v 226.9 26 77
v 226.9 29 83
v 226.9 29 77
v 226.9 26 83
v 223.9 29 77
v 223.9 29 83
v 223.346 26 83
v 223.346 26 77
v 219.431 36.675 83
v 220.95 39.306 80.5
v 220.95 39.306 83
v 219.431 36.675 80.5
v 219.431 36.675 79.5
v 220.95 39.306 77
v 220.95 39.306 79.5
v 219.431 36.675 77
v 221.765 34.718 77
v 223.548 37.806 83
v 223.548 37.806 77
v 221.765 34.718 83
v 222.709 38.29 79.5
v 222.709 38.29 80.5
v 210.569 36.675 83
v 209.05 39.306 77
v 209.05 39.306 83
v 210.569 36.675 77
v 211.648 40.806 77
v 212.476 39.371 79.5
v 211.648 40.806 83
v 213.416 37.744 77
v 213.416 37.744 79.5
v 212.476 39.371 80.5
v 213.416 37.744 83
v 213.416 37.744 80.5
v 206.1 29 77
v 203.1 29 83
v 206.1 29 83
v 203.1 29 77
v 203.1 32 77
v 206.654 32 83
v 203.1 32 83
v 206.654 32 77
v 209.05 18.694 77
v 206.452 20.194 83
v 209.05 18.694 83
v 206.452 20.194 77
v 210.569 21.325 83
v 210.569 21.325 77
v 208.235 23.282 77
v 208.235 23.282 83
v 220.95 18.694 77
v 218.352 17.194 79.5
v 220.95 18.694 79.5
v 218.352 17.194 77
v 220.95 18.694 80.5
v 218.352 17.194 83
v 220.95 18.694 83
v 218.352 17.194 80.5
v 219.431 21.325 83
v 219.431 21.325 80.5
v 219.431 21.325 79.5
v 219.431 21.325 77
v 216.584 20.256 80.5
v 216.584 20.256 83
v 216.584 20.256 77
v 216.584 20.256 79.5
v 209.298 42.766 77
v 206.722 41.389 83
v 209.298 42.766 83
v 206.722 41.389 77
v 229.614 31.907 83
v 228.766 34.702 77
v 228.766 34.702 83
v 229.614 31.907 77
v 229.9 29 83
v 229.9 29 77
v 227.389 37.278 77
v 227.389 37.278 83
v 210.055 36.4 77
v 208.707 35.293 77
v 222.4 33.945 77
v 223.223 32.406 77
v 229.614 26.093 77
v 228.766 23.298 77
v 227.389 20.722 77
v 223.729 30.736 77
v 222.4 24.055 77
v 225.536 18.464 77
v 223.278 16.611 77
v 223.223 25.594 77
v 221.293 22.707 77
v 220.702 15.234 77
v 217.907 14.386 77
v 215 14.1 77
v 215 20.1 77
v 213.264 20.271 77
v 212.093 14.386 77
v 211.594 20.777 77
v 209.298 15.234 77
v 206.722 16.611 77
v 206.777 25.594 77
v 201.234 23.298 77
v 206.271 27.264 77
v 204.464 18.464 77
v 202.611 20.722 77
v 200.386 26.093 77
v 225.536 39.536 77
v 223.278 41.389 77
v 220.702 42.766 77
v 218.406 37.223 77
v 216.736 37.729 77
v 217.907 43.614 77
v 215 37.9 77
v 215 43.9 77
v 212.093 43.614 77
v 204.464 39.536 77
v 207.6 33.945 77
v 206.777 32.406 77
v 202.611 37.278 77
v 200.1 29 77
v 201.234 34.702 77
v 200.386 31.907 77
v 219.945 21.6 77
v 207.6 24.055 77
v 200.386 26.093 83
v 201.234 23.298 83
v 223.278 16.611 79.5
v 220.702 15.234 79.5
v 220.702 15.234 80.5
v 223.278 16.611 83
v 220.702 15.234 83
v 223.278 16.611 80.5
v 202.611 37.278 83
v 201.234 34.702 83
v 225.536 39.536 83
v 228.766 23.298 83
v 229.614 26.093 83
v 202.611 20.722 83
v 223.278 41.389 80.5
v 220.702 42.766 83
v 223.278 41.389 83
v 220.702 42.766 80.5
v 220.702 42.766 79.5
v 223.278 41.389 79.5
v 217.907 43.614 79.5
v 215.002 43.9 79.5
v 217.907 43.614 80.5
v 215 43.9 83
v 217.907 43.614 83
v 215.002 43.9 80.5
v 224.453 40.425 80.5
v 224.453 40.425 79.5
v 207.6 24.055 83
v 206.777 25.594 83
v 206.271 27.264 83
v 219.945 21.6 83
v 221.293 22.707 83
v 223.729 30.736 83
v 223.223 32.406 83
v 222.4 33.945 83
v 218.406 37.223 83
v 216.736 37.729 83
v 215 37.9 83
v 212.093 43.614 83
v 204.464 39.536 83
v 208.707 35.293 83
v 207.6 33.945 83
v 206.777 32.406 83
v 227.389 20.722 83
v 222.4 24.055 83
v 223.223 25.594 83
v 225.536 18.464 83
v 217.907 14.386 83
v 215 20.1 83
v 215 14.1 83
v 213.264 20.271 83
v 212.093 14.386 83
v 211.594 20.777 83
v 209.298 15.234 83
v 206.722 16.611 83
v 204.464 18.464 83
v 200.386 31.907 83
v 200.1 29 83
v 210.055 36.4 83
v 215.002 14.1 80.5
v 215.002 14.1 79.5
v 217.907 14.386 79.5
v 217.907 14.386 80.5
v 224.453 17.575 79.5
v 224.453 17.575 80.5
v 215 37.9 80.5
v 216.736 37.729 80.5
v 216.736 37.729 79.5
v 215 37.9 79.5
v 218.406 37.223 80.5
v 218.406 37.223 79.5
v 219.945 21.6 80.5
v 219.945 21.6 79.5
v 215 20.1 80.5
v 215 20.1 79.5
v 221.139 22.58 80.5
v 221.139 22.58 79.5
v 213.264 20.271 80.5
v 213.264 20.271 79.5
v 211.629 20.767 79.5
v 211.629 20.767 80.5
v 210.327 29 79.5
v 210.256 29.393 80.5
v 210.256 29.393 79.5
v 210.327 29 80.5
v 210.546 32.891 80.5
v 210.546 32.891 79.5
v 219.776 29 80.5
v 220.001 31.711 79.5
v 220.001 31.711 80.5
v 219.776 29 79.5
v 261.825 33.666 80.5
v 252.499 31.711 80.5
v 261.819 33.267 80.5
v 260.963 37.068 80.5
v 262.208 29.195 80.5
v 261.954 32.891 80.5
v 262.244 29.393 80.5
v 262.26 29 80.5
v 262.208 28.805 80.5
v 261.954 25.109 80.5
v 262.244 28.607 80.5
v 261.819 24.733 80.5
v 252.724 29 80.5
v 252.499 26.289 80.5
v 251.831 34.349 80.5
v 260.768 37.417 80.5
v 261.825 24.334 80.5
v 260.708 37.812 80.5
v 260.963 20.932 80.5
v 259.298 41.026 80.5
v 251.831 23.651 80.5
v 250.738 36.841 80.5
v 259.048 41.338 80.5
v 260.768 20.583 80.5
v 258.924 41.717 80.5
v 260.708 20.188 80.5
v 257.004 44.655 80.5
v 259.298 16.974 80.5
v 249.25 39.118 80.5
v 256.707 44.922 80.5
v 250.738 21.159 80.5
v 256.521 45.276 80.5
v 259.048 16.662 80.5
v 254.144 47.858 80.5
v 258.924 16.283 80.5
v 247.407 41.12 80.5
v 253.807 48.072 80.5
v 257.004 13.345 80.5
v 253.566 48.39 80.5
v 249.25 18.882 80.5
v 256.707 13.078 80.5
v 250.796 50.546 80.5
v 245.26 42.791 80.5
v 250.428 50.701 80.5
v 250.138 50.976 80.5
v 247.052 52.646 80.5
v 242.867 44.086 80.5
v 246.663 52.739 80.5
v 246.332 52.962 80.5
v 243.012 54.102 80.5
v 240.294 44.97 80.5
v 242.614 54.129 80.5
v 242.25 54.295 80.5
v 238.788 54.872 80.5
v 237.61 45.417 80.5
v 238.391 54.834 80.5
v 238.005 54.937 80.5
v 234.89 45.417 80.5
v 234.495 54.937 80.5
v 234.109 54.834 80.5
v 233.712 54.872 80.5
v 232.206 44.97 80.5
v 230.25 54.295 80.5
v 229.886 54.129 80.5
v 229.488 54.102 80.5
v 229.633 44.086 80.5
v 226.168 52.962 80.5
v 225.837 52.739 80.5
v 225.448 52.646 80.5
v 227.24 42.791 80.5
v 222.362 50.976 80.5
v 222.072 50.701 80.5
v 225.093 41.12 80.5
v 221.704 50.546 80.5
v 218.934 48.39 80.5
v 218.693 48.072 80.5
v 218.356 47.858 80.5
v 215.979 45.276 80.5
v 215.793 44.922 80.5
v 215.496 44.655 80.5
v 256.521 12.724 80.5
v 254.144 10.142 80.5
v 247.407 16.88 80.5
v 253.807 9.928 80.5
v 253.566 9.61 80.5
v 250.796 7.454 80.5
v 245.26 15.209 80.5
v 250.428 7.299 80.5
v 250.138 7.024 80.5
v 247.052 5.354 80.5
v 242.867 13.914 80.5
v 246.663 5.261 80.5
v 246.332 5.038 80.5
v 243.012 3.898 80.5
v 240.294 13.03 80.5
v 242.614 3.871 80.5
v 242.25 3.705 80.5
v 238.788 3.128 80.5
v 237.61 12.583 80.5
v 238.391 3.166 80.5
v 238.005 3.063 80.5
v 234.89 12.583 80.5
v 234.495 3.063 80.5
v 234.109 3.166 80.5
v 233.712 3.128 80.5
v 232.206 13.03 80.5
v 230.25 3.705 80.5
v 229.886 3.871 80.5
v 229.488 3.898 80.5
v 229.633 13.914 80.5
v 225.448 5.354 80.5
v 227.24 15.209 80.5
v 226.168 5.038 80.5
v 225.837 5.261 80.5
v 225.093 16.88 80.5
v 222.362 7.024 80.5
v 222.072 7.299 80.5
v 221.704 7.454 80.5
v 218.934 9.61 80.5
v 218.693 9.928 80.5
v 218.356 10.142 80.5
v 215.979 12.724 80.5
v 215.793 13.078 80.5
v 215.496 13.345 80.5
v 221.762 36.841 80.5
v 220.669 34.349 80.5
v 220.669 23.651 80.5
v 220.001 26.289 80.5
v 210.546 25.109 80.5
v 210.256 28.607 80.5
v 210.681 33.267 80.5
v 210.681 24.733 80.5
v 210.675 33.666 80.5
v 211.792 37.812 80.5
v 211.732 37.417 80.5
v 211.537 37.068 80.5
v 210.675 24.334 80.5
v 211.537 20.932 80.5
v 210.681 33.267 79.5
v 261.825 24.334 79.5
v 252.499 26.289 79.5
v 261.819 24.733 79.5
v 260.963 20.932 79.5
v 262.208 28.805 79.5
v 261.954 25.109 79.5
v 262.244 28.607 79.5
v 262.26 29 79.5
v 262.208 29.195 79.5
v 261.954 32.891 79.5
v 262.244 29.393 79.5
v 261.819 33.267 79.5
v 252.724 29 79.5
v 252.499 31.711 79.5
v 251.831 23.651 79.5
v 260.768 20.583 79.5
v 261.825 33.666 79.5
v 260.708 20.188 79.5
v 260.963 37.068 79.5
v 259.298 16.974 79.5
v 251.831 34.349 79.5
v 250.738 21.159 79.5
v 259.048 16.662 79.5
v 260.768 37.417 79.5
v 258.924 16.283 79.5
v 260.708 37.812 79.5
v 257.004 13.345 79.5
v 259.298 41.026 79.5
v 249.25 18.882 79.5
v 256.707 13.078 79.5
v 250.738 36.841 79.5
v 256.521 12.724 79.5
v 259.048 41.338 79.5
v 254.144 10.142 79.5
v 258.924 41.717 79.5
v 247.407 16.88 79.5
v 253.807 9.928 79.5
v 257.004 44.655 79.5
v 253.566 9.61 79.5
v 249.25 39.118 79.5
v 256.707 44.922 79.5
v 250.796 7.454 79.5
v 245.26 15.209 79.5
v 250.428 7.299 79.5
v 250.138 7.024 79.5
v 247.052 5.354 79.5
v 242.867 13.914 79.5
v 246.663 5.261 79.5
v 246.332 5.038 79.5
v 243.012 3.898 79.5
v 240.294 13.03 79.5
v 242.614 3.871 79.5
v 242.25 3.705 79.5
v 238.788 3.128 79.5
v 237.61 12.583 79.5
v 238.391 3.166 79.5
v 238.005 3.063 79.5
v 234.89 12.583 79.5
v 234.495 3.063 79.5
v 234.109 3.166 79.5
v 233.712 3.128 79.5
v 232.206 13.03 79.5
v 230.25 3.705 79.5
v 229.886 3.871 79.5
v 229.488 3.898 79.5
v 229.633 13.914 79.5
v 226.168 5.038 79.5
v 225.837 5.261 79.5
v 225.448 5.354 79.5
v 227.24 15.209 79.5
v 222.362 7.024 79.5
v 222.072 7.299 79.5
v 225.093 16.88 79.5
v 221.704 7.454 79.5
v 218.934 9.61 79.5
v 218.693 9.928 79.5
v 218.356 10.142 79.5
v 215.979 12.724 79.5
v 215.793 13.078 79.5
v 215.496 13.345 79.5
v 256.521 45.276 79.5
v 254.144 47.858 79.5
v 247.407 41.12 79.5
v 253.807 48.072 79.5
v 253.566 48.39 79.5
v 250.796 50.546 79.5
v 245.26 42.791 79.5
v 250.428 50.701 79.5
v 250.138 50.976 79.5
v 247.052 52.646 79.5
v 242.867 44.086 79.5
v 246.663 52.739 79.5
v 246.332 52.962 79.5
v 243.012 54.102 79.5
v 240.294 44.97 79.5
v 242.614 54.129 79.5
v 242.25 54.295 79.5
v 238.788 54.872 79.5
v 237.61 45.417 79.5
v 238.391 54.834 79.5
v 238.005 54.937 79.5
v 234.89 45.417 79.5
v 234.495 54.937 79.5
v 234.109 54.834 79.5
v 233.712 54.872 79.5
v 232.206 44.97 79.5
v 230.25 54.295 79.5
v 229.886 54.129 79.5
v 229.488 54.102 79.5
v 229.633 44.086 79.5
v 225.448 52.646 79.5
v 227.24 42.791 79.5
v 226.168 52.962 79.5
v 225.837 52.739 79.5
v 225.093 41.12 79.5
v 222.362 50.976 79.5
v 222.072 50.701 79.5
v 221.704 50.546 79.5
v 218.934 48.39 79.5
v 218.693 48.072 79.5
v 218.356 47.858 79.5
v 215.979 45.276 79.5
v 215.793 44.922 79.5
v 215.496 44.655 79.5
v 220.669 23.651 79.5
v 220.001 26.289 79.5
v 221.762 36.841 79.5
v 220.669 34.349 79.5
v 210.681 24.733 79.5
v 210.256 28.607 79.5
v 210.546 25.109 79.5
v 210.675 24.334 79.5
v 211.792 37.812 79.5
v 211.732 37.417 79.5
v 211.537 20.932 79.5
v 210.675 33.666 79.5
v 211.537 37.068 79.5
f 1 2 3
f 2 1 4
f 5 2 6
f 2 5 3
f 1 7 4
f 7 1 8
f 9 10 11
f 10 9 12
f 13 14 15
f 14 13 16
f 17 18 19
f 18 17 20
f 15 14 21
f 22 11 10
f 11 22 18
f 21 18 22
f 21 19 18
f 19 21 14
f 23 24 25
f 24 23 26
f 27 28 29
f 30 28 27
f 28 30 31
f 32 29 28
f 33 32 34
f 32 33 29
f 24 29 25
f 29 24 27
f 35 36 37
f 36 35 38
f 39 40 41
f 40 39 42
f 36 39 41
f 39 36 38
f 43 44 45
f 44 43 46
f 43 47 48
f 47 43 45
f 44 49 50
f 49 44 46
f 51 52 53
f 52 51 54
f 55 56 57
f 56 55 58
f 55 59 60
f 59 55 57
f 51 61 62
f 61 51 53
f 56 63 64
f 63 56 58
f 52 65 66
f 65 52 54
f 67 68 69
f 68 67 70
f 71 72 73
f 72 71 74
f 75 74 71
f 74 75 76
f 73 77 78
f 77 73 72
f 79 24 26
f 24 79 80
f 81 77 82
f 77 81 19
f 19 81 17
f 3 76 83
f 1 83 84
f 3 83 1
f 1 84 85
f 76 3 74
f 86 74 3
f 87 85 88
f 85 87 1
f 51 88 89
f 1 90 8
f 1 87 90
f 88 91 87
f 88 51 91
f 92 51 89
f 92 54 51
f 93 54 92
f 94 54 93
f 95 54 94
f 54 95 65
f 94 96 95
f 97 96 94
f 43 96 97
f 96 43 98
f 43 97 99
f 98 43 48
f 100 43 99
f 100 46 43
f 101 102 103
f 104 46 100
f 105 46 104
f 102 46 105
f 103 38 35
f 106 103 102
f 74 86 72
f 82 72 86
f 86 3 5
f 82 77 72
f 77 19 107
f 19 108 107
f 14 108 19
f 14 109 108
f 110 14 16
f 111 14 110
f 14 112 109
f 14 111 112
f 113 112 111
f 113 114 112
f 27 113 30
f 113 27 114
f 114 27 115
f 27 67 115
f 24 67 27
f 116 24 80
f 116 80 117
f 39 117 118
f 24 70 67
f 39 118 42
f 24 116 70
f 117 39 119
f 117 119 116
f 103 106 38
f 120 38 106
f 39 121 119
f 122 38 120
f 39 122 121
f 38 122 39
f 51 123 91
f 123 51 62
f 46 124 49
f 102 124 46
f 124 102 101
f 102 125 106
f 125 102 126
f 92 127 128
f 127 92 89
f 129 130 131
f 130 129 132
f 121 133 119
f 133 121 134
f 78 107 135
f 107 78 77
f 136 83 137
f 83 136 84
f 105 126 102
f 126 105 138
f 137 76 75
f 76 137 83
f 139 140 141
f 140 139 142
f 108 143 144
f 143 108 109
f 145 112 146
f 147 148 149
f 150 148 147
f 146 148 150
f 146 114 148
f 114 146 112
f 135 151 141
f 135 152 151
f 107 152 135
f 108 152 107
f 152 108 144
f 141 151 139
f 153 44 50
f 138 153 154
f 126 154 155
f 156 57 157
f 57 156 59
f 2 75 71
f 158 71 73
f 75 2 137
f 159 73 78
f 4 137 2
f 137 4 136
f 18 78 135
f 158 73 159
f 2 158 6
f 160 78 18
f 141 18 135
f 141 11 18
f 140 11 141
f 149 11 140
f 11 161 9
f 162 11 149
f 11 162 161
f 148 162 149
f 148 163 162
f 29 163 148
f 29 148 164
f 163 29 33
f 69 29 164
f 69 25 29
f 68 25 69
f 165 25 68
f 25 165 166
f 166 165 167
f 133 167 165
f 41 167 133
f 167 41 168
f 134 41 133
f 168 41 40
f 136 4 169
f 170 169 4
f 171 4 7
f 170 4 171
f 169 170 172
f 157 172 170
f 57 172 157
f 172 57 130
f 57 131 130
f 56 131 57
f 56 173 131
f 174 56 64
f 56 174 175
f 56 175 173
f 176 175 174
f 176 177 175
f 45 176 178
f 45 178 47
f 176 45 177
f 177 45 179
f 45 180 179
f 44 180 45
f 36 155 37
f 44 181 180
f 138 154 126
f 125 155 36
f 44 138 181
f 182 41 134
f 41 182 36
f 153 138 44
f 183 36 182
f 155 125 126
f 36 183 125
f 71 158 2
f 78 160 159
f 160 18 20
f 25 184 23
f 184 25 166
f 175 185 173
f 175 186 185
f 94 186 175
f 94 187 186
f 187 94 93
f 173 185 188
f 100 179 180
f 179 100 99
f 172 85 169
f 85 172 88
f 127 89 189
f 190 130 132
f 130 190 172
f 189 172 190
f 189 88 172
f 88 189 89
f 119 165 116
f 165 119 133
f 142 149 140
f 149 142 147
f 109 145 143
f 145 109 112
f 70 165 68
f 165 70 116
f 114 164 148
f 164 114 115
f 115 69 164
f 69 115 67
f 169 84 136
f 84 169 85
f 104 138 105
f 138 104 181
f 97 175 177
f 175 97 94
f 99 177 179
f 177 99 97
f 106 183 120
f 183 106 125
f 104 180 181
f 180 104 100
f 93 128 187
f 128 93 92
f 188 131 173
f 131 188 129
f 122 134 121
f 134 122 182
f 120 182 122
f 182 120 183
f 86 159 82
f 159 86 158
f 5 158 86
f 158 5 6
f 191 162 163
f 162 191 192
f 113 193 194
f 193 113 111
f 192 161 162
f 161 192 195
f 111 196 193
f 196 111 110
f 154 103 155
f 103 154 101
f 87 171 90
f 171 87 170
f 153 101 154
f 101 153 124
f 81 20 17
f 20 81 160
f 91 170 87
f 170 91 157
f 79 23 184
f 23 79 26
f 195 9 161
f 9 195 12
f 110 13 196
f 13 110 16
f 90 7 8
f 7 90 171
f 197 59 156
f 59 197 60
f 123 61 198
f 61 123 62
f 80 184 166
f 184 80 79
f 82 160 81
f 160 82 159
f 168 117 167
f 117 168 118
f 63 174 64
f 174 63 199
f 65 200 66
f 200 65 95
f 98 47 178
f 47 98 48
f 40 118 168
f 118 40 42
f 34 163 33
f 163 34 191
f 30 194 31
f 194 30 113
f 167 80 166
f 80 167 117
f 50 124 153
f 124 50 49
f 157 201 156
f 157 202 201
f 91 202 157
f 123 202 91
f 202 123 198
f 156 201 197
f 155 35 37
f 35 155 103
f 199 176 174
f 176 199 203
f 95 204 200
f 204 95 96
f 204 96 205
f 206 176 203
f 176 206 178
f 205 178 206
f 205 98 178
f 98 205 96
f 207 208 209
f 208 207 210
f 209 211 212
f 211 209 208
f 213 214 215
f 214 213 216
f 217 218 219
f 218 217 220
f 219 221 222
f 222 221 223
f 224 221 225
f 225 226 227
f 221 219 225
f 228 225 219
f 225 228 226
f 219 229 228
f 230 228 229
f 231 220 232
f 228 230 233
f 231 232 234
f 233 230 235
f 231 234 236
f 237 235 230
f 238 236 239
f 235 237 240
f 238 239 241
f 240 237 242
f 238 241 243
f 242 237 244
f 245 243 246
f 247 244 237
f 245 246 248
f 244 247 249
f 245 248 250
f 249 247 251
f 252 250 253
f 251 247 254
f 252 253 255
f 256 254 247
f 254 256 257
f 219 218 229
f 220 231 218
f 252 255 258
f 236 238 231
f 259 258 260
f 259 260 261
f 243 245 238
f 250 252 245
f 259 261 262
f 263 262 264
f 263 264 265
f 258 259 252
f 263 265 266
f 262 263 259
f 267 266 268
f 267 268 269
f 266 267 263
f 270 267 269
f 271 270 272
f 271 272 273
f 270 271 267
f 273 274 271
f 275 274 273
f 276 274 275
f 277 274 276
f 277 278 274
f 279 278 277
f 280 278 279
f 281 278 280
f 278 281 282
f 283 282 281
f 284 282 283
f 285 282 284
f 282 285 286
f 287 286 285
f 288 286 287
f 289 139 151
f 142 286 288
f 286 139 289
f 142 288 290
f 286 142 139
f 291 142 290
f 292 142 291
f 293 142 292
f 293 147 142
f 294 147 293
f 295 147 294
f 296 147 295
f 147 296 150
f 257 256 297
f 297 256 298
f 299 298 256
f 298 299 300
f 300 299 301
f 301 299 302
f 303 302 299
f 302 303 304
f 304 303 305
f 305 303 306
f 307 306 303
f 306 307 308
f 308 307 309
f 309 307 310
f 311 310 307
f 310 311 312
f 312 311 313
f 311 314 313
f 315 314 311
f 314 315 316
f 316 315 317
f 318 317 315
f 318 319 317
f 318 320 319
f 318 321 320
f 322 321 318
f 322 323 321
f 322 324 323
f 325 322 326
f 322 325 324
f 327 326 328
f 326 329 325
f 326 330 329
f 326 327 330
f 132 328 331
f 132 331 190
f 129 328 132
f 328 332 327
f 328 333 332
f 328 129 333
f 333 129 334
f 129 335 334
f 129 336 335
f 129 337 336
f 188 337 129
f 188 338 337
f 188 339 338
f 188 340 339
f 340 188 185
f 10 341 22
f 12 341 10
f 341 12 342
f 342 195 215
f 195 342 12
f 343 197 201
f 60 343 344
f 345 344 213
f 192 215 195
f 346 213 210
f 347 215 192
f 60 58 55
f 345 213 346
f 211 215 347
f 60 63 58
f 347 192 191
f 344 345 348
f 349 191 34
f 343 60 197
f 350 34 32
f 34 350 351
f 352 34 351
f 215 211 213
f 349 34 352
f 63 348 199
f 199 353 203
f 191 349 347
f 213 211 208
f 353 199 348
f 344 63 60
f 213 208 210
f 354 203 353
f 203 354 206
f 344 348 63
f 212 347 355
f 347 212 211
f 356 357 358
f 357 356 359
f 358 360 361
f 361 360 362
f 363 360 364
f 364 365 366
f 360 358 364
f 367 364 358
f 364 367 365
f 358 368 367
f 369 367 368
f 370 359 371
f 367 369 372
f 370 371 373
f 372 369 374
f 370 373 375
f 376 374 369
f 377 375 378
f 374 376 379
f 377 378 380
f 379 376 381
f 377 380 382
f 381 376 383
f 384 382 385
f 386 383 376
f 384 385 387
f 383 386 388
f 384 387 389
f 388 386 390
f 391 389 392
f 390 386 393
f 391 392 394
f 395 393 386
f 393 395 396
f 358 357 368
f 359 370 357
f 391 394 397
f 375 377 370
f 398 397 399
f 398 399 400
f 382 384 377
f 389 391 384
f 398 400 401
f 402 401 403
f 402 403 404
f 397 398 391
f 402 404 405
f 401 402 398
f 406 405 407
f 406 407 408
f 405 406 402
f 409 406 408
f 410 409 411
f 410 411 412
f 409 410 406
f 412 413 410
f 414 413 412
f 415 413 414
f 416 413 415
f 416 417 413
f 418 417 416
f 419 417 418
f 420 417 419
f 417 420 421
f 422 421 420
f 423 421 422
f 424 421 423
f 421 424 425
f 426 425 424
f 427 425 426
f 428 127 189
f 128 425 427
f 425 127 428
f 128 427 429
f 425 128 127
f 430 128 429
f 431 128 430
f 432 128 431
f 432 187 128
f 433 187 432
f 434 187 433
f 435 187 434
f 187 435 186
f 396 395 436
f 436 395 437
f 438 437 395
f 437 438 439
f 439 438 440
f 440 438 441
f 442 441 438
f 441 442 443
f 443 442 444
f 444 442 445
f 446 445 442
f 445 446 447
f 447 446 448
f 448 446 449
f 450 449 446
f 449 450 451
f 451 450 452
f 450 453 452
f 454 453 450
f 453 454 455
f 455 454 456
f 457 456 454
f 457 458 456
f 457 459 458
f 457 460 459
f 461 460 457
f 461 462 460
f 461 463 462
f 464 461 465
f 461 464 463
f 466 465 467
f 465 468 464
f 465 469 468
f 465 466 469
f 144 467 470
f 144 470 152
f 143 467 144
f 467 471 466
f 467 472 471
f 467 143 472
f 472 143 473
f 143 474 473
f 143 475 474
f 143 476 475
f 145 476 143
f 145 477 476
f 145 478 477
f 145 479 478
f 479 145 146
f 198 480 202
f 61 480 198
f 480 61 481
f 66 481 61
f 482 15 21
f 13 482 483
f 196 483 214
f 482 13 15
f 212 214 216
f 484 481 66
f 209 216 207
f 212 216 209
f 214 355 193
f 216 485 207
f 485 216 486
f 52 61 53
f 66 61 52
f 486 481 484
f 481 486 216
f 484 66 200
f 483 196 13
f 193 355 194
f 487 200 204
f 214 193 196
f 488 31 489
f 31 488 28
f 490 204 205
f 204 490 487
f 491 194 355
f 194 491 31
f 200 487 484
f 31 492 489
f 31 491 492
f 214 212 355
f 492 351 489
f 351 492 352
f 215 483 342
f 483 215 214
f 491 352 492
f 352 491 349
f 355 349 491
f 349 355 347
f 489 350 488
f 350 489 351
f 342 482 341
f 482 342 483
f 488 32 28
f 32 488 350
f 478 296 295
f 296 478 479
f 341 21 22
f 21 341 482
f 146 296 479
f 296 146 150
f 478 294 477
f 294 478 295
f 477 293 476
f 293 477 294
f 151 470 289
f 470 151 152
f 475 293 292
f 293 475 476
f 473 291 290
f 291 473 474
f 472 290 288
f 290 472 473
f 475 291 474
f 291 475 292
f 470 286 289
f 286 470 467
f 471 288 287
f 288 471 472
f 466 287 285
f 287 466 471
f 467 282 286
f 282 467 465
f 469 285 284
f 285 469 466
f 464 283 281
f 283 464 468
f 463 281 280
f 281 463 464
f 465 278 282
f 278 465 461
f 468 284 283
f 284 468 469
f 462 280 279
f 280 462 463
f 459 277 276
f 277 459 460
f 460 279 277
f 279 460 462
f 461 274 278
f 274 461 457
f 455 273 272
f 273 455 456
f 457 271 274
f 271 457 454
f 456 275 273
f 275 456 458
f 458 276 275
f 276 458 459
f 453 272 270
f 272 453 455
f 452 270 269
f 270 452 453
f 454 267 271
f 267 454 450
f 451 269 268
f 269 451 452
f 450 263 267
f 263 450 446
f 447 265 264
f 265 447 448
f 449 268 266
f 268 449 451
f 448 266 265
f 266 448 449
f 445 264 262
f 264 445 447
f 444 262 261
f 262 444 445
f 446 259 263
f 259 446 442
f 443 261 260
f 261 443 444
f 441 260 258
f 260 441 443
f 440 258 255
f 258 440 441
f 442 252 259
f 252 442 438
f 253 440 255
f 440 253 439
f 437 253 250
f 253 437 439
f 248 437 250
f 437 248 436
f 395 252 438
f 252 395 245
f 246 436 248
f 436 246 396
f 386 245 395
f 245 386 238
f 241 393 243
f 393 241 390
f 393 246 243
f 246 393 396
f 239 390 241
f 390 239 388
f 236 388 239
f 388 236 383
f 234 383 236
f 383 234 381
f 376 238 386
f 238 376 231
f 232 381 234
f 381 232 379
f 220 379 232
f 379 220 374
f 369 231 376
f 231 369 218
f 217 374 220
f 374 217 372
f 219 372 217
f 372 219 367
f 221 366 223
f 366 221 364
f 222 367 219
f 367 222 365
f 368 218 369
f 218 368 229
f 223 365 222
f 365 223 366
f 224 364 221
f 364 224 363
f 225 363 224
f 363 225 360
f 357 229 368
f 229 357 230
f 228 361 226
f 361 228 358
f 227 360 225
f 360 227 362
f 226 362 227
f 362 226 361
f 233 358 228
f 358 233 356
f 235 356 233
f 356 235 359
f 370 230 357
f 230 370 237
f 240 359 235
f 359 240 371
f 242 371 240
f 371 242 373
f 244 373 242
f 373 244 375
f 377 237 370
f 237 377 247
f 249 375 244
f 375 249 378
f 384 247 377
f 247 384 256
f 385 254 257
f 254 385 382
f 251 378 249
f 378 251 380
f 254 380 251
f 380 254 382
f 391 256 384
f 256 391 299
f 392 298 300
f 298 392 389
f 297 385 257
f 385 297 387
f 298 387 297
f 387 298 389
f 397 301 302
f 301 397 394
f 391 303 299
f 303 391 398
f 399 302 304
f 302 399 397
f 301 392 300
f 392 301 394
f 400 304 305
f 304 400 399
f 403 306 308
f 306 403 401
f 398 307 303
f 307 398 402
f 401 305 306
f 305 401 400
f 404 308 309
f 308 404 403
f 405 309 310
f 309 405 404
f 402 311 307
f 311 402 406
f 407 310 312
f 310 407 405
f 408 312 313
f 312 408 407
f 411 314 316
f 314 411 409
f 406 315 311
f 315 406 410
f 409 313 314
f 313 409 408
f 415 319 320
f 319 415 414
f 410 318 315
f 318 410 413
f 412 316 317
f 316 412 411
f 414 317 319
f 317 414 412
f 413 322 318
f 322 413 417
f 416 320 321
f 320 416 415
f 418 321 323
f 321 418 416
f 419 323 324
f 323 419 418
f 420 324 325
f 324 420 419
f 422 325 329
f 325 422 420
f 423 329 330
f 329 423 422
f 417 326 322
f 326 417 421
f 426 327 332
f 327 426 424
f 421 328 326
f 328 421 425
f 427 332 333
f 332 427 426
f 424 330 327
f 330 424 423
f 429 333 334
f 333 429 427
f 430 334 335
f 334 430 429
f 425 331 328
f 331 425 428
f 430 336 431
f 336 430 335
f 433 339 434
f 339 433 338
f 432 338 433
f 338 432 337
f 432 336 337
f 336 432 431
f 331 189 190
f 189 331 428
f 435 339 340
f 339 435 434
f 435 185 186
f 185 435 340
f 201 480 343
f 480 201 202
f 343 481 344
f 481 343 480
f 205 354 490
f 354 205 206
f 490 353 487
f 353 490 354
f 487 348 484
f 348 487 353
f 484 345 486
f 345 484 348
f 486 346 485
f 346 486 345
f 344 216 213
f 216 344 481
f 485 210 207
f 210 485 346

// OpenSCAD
// Victorian Ornamental Shelf Bracket - Production Design
// Based on classic wrought iron with hanging S-scroll ornaments

// === MAIN PARAMETERS ===
shelf_arm_length = 250;    // Horizontal arm length
shelf_arm_width = 35;      // Width of main support arm
shelf_arm_thickness = 15;  // Thickness (depth) of main arm

// Wall mounting
wall_plate_width = 90;
wall_plate_height = 160;
wall_plate_thickness = 8;

// Scroll ornaments
num_scrolls = 1;           // Number of hanging scrolls
scroll_base_radius = 25;   // Radius of largest scroll
scroll_thickness = 14;     // Thickness of scroll tubing
scroll_depth = 80;         // How far scrolls extend downward

// Decorative banding
band_thickness = 6;        // Thickness of wrapping bands
band_width = 28;           // Width of bands
num_bands = 6;             // Flutes/ridges per band

// Mounting
bolt_hole_diameter = 9;

// === MAIN ASSEMBLY ===
module victorian_shelf_bracket() {
    union() {
        // 1. Wall mounting plate
        // wall_plate();
        
        // 2. Main horizontal shelf arm
        // shelf_arm();
        
        // 3. Connection reinforcement at wall
        // arm_wall_connection();
        
        // 4. Ornamental hanging scrolls
        hanging_scrolls();
    }
}

// === WALL MOUNTING PLATE ===
module wall_plate() {
    difference() {
        // Main plate
        cube([wall_plate_width, wall_plate_thickness, wall_plate_height]);
        
        // Bolt holes (3 hole vertical array)
        for(hole_y = [25, 80, 135]) {
            translate([wall_plate_width/2, -1, hole_y])
                cylinder(h=wall_plate_thickness+2, r=bolt_hole_diameter/2, $fn=32);
        }
        
        // Decorative perforations along plate
        for(y_pos = [40:40:wall_plate_height-40]) {
            translate([wall_plate_width*0.2, -1, y_pos])
                cylinder(h=wall_plate_thickness+2, r=3.5, $fn=24);
            translate([wall_plate_width*0.8, -1, y_pos])
                cylinder(h=wall_plate_thickness+2, r=3.5, $fn=24);
        }
    }
}

// === MAIN SHELF ARM ===
module shelf_arm() {
    // Tapered main arm (thicker near wall, tapers toward end)
    translate([wall_plate_width, wall_plate_thickness/2, wall_plate_height*0.5]) {
        hull() {
            // Base at wall (thicker)
            cube([5, shelf_arm_thickness, shelf_arm_width], center=true);
            
            // Tapered end
            translate([shelf_arm_length - 5, 0, 0])
                cube([5, shelf_arm_thickness * 0.7, shelf_arm_width * 0.8], center=true);
        }
    }
    
    // Fluted/ridged details along arm for visual interest
    for(ridge_pos = [20:35:shelf_arm_length-20]) {
        translate([wall_plate_width + ridge_pos, wall_plate_thickness/2 - shelf_arm_thickness/2, wall_plate_height*0.5 - shelf_arm_width/2]) {
            cube([2, shelf_arm_thickness/2, shelf_arm_width + 8]);
        }
    }
}

// === ARM-TO-WALL CONNECTION REINFORCEMENT ===
module arm_wall_connection() {
    // Reinforcement where arm meets wall plate
    translate([wall_plate_width - 8, wall_plate_thickness/2, wall_plate_height*0.5]) {
        cube([8, shelf_arm_thickness + 4, shelf_arm_width + 6], center=true);
    }
}

// === HANGING ORNAMENTAL SCROLLS ===
module hanging_scrolls() {
    // Distribute scrolls along the length of the arm
    for(scroll_index = [0:num_scrolls-1]) {
        // Position along arm
        t = (scroll_index + 1) / (num_scrolls + 1); // Distribute evenly
        scroll_x = wall_plate_width + t * shelf_arm_length;
        
        // Scale: slightly smaller as we move away from wall
        scale_factor = 0.7 + 0.3 * (1 - t);
        
        // Position below the arm
        translate([scroll_x, wall_plate_thickness/2 + shelf_arm_thickness + 10, wall_plate_height*0.5]) {
            // Decorative band at connection point
            connection_band(scale_factor);
            
            // Hanging scroll ornament
            ornamental_s_scroll(
                scroll_base_radius * scale_factor,
                scroll_thickness * scale_factor * 0.8,
                scroll_index
            );
        }
    }
}

// === CONNECTION BAND (Decorative Wrapping at Scroll) ===
module connection_band(scale) {
    size = band_width * scale;
    thick = band_thickness;
    
    difference() {
        // Main band ring
        cylinder(h=thick, r=size/2 + 3, $fn=32, center=true);
        
        // Inner hole
        cylinder(h=thick+2, r=size/2 - 3, $fn=32, center=true);
        
        // Fluted ridges on top
        for(ridge = [0:num_bands-1]) {
            angle = (ridge / num_bands) * 360;
            rotate([0, 0, angle]) {
                translate([size/2 - 2, -1.5, 0])
                    cube([4, 3, thick+2], center=true);
            }
        }
    }
}

// === GENERATE C-CURVE POINTS ===
function c_curve_points(radius, num_points) = [
    for(i = [0:num_points-1])
    let(angle = (i / (num_points - 1)) * 180)
    [radius * cos(angle), radius * sin(angle)]
];

// === GENERATE S-CURVE POINTS (2D PROFILE) ===
function s_curve_points(radius, num_points) = 
    concat(
        [for(i = [0:num_points-1])
            let(angle = (i / (num_points - 1)) * 180)
            [radius * (1 - cos(angle)), radius * sin(angle)]
        ],
        [for(i = [num_points-1:-1:0])
            let(angle = (i / (num_points - 1)) * 180)
            [radius * (1 - cos(angle)), -radius * sin(angle)]
        ]
    );

// === ORNAMENTAL S-SCROLL (Using Polygon + Linear Extrude) ===
module ornamental_s_scroll(radius, thickness, scroll_id) {
    num_curve_points = 20;
    
    // Get the S-curve path
    curve_path = s_curve_points(radius, num_curve_points);
    
    // Create 2D cross-section profile (tubing shape)
    profile_radius = thickness / 2;
    profile_points = circle_profile(profile_radius, 12);
    
    // Create the scroll by placing hulled profiles along the curve
    for(i = [0:len(curve_path)-2]) {
        p1 = curve_path[i];
        p2 = curve_path[i+1];
        
        // Calculate rotation angle between points
        angle = atan2(p2[1] - p1[1], p2[0] - p1[0]);
        
        // Hull between rotated profiles
        hull() {
            translate([p1[0], p1[1], 0])
                rotate([0, 0, angle])
                    linear_extrude(height=1, center=true)
                        polygon(profile_points);
            
            translate([p2[0], p2[1], 0])
                rotate([0, 0, angle])
                    linear_extrude(height=1, center=true)
                        polygon(profile_points);
        }
    }
    
    // Add ornamental bulbs at curve endpoints
    // translate([curve_path[0][0], curve_path[0][1], 0])
    //     sphere(r=thickness*1.3, $fn=20);
    
    // translate([curve_path[len(curve_path)-1][0], curve_path[len(curve_path)-1][1], 0])
    //     sphere(r=thickness*1.1, $fn=20);
}

// === GENERATE CIRCULAR PROFILE POINTS ===
function circle_profile(radius, segments) = [
    for(i = [0:segments-1])
    let(angle = (i / segments) * 360)
    [radius * cos(angle), radius * sin(angle)]
];

// === RENDER COMPLETE BRACKET ===
victorian_shelf_bracket();

// === REFERENCE PLANES (for visualization, use % to hide) ===
// Wall surface
// %translate([-20, -10, 0]) cube([30, 1, 200]);

// Shelf surface reference
// %translate([wall_plate_width - 20, wall_plate_thickness + shelf_arm_thickness + 5, wall_plate_height*0.5 - shelf_arm_width/2]) 
//     cube([shelf_arm_length + 40, 1, shelf_arm_width + 20]);
